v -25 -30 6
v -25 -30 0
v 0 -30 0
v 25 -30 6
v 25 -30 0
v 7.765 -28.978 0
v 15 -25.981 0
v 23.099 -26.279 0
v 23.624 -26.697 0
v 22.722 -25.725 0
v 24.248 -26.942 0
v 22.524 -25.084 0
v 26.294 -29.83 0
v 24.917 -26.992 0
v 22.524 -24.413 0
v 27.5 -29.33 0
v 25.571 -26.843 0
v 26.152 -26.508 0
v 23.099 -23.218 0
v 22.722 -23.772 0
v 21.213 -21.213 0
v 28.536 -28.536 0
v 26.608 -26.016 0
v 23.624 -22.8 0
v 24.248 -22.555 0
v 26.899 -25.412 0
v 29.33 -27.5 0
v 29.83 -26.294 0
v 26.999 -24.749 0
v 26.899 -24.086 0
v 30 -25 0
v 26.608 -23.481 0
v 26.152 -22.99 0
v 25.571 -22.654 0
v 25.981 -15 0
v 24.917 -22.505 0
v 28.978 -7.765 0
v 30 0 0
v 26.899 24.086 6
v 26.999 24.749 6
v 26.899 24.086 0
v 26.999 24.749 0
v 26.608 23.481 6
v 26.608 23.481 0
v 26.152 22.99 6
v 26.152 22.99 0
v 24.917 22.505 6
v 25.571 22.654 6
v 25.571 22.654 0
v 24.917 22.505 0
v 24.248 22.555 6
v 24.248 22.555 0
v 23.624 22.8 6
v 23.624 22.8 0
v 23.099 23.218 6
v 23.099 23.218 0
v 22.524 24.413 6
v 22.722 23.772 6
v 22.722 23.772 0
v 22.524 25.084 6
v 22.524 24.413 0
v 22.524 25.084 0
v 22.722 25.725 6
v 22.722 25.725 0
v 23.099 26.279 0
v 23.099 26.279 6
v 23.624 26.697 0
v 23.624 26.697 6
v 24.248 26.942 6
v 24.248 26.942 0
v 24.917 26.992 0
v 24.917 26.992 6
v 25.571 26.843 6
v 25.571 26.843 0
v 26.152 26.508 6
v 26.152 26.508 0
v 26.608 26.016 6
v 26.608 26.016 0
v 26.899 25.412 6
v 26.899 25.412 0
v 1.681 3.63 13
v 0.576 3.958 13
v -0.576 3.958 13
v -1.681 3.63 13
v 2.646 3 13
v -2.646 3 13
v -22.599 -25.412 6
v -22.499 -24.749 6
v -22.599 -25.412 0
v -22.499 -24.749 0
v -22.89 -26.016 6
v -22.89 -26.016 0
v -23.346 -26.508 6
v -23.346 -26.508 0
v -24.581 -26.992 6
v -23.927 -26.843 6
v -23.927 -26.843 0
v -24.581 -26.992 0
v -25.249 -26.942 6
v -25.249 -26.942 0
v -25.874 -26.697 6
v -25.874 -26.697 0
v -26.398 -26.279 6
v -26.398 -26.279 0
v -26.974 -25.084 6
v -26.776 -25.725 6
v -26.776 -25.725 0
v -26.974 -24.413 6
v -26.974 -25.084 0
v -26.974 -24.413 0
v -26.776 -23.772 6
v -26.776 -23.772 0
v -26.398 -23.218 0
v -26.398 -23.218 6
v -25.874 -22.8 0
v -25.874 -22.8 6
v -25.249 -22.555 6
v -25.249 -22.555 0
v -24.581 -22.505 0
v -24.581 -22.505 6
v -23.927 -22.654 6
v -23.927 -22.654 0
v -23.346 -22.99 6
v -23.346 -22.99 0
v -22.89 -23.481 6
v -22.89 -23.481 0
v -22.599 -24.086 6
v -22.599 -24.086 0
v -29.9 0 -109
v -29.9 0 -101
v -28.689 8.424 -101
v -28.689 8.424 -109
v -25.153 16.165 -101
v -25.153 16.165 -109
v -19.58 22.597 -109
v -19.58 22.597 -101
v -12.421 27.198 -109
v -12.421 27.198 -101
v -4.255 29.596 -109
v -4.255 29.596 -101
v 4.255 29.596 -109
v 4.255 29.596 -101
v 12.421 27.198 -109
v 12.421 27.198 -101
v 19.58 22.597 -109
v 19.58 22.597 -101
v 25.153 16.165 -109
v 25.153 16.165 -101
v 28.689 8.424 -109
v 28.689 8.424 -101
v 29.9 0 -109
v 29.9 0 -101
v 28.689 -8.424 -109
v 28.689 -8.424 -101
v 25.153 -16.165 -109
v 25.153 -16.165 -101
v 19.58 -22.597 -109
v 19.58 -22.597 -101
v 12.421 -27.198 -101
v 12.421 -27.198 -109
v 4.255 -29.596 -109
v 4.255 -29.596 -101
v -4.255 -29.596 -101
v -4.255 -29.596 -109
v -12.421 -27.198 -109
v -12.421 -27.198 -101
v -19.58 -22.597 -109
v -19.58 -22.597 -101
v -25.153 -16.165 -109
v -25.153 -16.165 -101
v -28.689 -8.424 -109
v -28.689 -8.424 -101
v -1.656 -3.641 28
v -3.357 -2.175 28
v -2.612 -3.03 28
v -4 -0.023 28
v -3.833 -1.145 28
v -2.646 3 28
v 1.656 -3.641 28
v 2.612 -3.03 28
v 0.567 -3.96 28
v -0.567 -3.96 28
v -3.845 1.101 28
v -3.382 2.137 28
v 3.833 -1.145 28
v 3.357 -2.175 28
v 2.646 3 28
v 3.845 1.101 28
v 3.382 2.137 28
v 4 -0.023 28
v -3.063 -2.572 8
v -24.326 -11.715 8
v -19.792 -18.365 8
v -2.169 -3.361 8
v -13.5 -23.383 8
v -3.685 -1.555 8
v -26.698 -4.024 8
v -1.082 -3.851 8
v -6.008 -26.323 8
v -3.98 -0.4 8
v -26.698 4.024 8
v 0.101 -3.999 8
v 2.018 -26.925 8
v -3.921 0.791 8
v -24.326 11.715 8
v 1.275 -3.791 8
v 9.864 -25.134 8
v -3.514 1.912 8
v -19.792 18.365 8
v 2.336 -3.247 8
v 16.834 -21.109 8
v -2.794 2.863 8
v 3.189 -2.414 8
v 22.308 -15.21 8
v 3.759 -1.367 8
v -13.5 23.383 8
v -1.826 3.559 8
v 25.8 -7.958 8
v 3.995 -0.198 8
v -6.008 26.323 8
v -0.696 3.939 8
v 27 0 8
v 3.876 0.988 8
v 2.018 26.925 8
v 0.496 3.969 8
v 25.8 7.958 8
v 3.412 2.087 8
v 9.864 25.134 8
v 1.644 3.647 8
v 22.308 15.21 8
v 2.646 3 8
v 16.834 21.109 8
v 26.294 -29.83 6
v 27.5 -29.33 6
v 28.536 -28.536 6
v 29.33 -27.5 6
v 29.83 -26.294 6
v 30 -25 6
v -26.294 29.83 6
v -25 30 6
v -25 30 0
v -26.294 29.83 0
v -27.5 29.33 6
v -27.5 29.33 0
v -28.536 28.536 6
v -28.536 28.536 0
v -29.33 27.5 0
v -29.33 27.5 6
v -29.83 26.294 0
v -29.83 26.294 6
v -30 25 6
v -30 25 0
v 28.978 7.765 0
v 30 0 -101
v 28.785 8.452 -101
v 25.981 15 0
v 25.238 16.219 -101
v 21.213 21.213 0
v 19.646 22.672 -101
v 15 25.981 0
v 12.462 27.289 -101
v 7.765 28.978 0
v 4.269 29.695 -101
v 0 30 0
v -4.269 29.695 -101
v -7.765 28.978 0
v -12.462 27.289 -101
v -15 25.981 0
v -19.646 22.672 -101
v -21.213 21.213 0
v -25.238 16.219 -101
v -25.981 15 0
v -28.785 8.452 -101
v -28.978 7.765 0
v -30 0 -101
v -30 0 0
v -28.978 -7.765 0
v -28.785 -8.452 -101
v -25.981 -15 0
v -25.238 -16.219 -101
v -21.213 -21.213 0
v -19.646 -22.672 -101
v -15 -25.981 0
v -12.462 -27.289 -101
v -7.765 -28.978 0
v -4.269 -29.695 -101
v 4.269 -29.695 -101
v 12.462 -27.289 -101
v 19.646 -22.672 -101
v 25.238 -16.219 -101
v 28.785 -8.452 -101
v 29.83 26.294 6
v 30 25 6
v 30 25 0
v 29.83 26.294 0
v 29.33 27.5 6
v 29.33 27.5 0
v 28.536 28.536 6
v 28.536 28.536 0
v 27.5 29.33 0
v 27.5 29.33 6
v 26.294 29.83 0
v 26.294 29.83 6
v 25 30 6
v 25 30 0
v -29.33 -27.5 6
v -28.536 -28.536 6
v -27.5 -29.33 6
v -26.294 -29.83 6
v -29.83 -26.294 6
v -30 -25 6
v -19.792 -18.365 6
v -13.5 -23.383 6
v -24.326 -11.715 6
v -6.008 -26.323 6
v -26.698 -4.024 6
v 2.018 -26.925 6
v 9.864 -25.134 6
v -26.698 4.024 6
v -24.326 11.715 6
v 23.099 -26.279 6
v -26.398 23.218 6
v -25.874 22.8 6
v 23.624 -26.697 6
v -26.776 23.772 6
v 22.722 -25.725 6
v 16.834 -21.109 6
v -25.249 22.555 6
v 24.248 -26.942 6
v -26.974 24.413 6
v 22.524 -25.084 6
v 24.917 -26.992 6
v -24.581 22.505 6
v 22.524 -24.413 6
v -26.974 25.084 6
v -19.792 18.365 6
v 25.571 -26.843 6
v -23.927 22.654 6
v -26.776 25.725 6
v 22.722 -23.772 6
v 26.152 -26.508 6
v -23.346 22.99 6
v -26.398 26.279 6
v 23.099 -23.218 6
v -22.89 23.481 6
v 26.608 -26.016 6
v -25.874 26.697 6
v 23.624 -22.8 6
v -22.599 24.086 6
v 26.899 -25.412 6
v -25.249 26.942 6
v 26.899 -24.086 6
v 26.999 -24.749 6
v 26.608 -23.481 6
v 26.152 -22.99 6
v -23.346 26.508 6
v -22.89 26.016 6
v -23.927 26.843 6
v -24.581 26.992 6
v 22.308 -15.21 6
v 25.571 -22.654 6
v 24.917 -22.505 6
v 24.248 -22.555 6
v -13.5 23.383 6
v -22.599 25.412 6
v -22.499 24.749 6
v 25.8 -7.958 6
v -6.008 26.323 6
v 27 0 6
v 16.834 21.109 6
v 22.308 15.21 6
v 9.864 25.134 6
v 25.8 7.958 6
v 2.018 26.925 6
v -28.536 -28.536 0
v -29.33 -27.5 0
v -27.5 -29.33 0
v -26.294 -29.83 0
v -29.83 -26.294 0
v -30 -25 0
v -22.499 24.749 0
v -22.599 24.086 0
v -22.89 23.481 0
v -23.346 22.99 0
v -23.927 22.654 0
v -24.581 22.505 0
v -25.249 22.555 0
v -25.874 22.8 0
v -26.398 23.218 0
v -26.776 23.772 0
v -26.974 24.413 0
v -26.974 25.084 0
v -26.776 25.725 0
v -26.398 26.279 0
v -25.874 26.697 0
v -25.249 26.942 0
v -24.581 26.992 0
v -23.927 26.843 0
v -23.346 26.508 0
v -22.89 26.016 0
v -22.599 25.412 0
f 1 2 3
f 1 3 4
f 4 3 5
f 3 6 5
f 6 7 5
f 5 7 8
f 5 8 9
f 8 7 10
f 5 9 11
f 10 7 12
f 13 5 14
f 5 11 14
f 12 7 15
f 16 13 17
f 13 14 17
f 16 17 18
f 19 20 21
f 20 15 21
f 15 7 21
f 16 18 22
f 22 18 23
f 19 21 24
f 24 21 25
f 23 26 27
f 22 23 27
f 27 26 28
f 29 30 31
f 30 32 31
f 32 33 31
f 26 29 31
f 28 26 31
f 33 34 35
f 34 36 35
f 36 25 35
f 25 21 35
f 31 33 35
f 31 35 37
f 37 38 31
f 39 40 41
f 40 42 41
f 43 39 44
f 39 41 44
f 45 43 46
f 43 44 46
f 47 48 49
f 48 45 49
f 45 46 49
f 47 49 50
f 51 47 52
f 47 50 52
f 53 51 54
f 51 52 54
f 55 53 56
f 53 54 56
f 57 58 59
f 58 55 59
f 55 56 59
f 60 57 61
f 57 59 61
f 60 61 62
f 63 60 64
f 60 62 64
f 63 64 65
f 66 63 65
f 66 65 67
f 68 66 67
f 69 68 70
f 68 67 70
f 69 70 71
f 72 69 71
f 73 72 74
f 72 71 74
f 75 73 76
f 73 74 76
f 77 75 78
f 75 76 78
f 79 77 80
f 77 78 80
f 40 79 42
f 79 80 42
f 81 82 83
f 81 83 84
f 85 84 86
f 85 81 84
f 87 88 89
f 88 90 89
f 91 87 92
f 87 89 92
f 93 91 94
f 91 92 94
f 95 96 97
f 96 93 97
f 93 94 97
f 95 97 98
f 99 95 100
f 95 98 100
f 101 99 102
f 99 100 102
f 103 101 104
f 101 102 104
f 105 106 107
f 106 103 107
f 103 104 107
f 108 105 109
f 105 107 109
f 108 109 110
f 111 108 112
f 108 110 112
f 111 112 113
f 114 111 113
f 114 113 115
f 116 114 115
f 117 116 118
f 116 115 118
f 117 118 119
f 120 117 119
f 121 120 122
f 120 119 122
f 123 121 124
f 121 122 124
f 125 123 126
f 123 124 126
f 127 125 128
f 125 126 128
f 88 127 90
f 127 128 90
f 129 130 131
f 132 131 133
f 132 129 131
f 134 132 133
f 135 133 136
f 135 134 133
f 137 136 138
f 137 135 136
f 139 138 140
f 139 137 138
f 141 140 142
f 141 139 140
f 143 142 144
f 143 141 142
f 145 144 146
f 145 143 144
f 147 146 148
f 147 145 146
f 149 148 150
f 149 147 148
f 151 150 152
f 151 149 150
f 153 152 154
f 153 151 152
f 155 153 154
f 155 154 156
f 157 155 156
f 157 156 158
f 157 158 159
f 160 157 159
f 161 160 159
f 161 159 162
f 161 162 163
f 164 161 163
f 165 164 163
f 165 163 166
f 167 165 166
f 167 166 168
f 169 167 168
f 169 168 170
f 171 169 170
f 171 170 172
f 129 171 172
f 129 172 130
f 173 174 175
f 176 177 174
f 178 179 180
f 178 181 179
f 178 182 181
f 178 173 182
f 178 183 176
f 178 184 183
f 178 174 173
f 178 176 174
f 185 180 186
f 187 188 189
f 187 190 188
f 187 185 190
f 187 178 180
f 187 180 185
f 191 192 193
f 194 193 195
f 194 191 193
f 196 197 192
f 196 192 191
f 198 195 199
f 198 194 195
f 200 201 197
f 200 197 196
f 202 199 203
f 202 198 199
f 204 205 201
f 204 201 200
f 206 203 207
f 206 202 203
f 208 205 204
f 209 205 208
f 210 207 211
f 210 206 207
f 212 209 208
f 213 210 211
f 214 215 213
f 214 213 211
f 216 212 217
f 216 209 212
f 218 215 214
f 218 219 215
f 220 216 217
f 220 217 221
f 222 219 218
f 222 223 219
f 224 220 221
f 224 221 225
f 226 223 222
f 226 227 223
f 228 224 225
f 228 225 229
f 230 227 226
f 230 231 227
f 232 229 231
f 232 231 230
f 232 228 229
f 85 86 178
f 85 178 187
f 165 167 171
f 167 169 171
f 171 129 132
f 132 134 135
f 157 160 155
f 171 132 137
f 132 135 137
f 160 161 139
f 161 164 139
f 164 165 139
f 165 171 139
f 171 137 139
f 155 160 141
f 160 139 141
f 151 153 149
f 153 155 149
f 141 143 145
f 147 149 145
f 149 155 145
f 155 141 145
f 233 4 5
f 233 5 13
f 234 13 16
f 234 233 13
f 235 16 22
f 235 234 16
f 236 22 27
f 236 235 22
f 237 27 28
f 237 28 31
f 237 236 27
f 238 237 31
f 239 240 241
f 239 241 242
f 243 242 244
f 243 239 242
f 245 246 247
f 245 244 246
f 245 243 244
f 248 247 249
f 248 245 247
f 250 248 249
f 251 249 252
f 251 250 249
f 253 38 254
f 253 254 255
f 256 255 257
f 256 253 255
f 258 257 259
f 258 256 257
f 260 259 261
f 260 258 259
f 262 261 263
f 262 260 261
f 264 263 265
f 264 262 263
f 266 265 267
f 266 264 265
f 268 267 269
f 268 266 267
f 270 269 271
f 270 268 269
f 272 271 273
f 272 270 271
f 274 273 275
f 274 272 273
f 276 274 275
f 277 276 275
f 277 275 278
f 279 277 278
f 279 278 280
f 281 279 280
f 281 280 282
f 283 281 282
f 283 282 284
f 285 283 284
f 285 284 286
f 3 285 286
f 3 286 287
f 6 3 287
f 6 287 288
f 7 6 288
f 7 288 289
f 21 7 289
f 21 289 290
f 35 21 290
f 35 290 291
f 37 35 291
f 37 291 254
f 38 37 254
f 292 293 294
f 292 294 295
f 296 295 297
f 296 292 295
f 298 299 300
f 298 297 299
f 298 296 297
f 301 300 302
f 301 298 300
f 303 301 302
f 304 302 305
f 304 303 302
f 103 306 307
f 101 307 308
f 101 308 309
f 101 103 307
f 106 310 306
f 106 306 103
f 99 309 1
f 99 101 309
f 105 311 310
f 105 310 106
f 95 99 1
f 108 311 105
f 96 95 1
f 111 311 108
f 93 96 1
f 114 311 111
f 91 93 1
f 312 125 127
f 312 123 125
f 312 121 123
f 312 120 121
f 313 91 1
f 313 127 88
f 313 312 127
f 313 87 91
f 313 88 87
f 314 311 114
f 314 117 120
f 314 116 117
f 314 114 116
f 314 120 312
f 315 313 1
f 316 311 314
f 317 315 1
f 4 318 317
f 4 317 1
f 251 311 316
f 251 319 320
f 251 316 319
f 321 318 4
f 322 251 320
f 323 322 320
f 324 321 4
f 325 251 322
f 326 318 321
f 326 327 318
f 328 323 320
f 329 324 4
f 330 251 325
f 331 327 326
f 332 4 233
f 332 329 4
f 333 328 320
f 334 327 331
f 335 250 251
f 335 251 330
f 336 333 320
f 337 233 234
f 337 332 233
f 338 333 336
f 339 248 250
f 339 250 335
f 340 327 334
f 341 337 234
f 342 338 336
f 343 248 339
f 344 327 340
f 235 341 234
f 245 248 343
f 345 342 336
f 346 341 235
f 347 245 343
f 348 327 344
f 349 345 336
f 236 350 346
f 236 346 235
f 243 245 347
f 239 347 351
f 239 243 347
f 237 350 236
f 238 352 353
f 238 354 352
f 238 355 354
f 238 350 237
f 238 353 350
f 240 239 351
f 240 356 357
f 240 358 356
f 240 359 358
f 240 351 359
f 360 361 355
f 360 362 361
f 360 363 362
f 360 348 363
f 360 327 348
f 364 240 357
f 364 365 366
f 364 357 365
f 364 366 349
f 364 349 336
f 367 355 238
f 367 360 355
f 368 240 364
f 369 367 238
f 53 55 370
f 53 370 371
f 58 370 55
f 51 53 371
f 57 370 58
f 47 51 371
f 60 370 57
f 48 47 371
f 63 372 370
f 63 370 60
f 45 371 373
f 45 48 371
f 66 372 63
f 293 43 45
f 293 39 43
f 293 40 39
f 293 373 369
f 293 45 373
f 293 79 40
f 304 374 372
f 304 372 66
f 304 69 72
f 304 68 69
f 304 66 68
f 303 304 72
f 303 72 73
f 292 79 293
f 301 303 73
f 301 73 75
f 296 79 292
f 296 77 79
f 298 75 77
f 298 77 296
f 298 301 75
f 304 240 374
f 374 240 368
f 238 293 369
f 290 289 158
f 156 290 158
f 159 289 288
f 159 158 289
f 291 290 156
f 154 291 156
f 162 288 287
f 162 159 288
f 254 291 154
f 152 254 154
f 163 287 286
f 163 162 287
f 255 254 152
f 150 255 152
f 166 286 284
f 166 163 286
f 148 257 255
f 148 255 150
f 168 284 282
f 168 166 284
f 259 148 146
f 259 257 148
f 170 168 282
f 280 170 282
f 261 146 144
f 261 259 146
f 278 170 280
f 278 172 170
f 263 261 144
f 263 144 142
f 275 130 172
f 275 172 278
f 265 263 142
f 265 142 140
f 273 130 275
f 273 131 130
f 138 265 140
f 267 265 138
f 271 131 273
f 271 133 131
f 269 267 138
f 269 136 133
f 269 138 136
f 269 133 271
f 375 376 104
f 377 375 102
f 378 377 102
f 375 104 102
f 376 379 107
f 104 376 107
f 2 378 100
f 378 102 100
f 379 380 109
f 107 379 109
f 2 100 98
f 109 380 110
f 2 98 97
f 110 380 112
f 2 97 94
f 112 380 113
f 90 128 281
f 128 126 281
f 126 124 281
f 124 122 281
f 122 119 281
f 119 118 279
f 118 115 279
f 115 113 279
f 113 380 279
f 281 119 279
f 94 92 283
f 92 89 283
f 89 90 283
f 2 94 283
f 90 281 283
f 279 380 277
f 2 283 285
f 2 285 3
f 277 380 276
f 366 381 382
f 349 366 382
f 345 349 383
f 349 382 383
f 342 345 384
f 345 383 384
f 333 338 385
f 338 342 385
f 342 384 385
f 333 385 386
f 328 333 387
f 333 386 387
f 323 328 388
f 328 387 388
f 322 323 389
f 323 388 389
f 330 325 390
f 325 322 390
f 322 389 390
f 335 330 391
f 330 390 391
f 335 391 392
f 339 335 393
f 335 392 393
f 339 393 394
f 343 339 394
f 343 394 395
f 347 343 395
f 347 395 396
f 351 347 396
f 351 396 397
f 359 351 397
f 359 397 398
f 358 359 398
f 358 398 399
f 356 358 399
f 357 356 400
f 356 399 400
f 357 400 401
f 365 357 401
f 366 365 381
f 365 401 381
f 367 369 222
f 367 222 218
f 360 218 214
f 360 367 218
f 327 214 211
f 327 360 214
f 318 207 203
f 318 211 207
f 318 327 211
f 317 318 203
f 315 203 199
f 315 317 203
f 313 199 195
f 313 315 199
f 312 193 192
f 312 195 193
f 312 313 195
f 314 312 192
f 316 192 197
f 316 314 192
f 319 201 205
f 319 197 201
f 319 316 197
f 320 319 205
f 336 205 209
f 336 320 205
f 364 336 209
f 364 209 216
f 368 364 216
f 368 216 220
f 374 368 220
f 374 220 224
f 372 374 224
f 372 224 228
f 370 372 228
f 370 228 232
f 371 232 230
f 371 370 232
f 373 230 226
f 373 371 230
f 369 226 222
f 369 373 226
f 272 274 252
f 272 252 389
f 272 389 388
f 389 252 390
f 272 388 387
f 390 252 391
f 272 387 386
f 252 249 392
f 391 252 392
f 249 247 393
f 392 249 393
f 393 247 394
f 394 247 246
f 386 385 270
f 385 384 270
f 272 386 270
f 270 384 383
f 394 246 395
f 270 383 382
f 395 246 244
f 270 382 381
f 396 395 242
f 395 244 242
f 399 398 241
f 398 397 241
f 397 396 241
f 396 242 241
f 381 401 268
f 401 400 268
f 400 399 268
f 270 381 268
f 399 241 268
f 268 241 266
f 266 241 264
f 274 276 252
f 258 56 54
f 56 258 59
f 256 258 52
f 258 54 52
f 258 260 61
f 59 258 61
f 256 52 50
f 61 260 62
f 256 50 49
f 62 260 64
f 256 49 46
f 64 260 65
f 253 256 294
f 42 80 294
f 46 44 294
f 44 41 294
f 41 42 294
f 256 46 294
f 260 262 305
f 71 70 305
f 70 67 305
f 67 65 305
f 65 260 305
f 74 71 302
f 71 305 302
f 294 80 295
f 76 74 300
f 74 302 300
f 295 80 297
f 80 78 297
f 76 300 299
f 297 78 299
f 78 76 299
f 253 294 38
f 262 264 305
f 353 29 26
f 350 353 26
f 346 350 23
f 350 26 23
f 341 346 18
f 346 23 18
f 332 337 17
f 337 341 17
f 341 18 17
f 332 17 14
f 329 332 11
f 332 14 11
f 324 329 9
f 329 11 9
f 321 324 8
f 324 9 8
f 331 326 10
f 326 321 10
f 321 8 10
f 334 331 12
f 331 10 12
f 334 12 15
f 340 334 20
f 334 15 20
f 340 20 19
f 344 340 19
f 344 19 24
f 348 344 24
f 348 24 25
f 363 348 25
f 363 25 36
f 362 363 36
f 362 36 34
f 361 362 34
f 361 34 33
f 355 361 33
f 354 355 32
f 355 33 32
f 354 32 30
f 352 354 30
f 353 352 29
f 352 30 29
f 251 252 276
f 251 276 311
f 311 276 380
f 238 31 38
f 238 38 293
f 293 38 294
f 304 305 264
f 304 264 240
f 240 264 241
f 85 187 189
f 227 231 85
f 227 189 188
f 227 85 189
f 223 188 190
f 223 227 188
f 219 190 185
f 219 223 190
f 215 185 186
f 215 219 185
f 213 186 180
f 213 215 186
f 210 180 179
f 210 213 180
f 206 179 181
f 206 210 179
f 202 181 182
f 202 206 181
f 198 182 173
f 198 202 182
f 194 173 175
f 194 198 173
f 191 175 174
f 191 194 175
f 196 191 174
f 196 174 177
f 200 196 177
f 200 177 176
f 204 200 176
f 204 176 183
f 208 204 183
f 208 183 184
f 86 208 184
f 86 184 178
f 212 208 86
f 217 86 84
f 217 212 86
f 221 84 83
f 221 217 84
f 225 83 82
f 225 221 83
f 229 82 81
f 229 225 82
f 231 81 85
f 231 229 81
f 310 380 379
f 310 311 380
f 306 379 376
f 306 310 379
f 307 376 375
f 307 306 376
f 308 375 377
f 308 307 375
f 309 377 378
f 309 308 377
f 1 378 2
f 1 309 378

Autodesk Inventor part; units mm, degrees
ref_plane "YZ Plane" through (0, 0, 0) normal (1, 0, 0) x (0, 1, 0)
ref_plane "XZ Plane" through (0, 0, 0) normal (0, 1, 0) x (-1, 0, 0)
ref_plane "XY Plane" through (0, 0, 0) normal (0, 0, 1) x (1, 0, 0)
sketch "스케치1" plane through (0, 0, 0) normal (0, 0, 1) x (1, 0, 0)
  line L0 (-30, -30) -> (30, -30)
  line L1 (30, -30) -> (30, 30)
  line L2 (30, 30) -> (-30, 30)
  line L3 (-30, 30) -> (-30, -30)
  line L4 (-30, -30) -> (30, 30) construction
  line L5 (30, -30) -> (-30, 30) construction
  circle A0 centre (0, 0) radius 30
  circle A1 centre (-24.7487, 24.7487) radius 2.25
  circle A2 centre (0, 0) radius 35 construction
  circle A3 centre (-24.7487, -24.7487) radius 2.25
  circle A4 centre (24.7487, -24.7487) radius 2.25
  circle A5 centre (24.7487, 24.7487) radius 2.25
  dimension "d3" = 70
  dimension "d0" = 60
  dimension "d1" = 60
  dimension "d2" = 4.5
  dimension "d6" = 360
extrude "돌출1" add sketch "스케치1" along normal blind 6
extrude "돌출2" add sketch "스케치1" against normal blind 109 contours A0
sketch "스케치2" plane through (0, 0, -109) normal (0, 0, -1) x (-1, 0, 0)
  circle A0 centre (0, 0) radius 30 projected
  circle A1 centre (0, 0) radius 29.9
  dimension "d12" = 0.1
extrude "돌출3" cut sketch "스케치2" against normal blind 8
sketch "스케치3" plane through (0, 0, 6) normal (0, 0, 1) x (1, 0, 0)
  circle A0 centre (0, 0) radius 27
  dimension "d15" = 54
extrude "돌출4" add sketch "스케치3" along normal blind 2
sketch "스케치4" plane through (0, 0, 8) normal (0, 0, 1) x (1, 0, 0)
  circle A0 centre (0, 0) radius 4
  line L0 (-2.6458, 3) -> (2.6458, 3)
  line L1 (0, 3) -> (0, -4)
  dimension "d18" = 8
  dimension "d19" = 7
extrude "돌출5" add sketch "스케치4" along normal blind 20 contours A0 L1 L0 | A0 L0 L1
extrude "돌출6" add sketch "스케치4" along normal blind 5 contours L0 A0
fillet "모깎기1" radius 5 4 edges at (-30, 30, 3) (30, 30, 3) (-30, -30, 3) (30, -30, 3)
properties part number "중형 모터 MB60080-2430 DC24V"
